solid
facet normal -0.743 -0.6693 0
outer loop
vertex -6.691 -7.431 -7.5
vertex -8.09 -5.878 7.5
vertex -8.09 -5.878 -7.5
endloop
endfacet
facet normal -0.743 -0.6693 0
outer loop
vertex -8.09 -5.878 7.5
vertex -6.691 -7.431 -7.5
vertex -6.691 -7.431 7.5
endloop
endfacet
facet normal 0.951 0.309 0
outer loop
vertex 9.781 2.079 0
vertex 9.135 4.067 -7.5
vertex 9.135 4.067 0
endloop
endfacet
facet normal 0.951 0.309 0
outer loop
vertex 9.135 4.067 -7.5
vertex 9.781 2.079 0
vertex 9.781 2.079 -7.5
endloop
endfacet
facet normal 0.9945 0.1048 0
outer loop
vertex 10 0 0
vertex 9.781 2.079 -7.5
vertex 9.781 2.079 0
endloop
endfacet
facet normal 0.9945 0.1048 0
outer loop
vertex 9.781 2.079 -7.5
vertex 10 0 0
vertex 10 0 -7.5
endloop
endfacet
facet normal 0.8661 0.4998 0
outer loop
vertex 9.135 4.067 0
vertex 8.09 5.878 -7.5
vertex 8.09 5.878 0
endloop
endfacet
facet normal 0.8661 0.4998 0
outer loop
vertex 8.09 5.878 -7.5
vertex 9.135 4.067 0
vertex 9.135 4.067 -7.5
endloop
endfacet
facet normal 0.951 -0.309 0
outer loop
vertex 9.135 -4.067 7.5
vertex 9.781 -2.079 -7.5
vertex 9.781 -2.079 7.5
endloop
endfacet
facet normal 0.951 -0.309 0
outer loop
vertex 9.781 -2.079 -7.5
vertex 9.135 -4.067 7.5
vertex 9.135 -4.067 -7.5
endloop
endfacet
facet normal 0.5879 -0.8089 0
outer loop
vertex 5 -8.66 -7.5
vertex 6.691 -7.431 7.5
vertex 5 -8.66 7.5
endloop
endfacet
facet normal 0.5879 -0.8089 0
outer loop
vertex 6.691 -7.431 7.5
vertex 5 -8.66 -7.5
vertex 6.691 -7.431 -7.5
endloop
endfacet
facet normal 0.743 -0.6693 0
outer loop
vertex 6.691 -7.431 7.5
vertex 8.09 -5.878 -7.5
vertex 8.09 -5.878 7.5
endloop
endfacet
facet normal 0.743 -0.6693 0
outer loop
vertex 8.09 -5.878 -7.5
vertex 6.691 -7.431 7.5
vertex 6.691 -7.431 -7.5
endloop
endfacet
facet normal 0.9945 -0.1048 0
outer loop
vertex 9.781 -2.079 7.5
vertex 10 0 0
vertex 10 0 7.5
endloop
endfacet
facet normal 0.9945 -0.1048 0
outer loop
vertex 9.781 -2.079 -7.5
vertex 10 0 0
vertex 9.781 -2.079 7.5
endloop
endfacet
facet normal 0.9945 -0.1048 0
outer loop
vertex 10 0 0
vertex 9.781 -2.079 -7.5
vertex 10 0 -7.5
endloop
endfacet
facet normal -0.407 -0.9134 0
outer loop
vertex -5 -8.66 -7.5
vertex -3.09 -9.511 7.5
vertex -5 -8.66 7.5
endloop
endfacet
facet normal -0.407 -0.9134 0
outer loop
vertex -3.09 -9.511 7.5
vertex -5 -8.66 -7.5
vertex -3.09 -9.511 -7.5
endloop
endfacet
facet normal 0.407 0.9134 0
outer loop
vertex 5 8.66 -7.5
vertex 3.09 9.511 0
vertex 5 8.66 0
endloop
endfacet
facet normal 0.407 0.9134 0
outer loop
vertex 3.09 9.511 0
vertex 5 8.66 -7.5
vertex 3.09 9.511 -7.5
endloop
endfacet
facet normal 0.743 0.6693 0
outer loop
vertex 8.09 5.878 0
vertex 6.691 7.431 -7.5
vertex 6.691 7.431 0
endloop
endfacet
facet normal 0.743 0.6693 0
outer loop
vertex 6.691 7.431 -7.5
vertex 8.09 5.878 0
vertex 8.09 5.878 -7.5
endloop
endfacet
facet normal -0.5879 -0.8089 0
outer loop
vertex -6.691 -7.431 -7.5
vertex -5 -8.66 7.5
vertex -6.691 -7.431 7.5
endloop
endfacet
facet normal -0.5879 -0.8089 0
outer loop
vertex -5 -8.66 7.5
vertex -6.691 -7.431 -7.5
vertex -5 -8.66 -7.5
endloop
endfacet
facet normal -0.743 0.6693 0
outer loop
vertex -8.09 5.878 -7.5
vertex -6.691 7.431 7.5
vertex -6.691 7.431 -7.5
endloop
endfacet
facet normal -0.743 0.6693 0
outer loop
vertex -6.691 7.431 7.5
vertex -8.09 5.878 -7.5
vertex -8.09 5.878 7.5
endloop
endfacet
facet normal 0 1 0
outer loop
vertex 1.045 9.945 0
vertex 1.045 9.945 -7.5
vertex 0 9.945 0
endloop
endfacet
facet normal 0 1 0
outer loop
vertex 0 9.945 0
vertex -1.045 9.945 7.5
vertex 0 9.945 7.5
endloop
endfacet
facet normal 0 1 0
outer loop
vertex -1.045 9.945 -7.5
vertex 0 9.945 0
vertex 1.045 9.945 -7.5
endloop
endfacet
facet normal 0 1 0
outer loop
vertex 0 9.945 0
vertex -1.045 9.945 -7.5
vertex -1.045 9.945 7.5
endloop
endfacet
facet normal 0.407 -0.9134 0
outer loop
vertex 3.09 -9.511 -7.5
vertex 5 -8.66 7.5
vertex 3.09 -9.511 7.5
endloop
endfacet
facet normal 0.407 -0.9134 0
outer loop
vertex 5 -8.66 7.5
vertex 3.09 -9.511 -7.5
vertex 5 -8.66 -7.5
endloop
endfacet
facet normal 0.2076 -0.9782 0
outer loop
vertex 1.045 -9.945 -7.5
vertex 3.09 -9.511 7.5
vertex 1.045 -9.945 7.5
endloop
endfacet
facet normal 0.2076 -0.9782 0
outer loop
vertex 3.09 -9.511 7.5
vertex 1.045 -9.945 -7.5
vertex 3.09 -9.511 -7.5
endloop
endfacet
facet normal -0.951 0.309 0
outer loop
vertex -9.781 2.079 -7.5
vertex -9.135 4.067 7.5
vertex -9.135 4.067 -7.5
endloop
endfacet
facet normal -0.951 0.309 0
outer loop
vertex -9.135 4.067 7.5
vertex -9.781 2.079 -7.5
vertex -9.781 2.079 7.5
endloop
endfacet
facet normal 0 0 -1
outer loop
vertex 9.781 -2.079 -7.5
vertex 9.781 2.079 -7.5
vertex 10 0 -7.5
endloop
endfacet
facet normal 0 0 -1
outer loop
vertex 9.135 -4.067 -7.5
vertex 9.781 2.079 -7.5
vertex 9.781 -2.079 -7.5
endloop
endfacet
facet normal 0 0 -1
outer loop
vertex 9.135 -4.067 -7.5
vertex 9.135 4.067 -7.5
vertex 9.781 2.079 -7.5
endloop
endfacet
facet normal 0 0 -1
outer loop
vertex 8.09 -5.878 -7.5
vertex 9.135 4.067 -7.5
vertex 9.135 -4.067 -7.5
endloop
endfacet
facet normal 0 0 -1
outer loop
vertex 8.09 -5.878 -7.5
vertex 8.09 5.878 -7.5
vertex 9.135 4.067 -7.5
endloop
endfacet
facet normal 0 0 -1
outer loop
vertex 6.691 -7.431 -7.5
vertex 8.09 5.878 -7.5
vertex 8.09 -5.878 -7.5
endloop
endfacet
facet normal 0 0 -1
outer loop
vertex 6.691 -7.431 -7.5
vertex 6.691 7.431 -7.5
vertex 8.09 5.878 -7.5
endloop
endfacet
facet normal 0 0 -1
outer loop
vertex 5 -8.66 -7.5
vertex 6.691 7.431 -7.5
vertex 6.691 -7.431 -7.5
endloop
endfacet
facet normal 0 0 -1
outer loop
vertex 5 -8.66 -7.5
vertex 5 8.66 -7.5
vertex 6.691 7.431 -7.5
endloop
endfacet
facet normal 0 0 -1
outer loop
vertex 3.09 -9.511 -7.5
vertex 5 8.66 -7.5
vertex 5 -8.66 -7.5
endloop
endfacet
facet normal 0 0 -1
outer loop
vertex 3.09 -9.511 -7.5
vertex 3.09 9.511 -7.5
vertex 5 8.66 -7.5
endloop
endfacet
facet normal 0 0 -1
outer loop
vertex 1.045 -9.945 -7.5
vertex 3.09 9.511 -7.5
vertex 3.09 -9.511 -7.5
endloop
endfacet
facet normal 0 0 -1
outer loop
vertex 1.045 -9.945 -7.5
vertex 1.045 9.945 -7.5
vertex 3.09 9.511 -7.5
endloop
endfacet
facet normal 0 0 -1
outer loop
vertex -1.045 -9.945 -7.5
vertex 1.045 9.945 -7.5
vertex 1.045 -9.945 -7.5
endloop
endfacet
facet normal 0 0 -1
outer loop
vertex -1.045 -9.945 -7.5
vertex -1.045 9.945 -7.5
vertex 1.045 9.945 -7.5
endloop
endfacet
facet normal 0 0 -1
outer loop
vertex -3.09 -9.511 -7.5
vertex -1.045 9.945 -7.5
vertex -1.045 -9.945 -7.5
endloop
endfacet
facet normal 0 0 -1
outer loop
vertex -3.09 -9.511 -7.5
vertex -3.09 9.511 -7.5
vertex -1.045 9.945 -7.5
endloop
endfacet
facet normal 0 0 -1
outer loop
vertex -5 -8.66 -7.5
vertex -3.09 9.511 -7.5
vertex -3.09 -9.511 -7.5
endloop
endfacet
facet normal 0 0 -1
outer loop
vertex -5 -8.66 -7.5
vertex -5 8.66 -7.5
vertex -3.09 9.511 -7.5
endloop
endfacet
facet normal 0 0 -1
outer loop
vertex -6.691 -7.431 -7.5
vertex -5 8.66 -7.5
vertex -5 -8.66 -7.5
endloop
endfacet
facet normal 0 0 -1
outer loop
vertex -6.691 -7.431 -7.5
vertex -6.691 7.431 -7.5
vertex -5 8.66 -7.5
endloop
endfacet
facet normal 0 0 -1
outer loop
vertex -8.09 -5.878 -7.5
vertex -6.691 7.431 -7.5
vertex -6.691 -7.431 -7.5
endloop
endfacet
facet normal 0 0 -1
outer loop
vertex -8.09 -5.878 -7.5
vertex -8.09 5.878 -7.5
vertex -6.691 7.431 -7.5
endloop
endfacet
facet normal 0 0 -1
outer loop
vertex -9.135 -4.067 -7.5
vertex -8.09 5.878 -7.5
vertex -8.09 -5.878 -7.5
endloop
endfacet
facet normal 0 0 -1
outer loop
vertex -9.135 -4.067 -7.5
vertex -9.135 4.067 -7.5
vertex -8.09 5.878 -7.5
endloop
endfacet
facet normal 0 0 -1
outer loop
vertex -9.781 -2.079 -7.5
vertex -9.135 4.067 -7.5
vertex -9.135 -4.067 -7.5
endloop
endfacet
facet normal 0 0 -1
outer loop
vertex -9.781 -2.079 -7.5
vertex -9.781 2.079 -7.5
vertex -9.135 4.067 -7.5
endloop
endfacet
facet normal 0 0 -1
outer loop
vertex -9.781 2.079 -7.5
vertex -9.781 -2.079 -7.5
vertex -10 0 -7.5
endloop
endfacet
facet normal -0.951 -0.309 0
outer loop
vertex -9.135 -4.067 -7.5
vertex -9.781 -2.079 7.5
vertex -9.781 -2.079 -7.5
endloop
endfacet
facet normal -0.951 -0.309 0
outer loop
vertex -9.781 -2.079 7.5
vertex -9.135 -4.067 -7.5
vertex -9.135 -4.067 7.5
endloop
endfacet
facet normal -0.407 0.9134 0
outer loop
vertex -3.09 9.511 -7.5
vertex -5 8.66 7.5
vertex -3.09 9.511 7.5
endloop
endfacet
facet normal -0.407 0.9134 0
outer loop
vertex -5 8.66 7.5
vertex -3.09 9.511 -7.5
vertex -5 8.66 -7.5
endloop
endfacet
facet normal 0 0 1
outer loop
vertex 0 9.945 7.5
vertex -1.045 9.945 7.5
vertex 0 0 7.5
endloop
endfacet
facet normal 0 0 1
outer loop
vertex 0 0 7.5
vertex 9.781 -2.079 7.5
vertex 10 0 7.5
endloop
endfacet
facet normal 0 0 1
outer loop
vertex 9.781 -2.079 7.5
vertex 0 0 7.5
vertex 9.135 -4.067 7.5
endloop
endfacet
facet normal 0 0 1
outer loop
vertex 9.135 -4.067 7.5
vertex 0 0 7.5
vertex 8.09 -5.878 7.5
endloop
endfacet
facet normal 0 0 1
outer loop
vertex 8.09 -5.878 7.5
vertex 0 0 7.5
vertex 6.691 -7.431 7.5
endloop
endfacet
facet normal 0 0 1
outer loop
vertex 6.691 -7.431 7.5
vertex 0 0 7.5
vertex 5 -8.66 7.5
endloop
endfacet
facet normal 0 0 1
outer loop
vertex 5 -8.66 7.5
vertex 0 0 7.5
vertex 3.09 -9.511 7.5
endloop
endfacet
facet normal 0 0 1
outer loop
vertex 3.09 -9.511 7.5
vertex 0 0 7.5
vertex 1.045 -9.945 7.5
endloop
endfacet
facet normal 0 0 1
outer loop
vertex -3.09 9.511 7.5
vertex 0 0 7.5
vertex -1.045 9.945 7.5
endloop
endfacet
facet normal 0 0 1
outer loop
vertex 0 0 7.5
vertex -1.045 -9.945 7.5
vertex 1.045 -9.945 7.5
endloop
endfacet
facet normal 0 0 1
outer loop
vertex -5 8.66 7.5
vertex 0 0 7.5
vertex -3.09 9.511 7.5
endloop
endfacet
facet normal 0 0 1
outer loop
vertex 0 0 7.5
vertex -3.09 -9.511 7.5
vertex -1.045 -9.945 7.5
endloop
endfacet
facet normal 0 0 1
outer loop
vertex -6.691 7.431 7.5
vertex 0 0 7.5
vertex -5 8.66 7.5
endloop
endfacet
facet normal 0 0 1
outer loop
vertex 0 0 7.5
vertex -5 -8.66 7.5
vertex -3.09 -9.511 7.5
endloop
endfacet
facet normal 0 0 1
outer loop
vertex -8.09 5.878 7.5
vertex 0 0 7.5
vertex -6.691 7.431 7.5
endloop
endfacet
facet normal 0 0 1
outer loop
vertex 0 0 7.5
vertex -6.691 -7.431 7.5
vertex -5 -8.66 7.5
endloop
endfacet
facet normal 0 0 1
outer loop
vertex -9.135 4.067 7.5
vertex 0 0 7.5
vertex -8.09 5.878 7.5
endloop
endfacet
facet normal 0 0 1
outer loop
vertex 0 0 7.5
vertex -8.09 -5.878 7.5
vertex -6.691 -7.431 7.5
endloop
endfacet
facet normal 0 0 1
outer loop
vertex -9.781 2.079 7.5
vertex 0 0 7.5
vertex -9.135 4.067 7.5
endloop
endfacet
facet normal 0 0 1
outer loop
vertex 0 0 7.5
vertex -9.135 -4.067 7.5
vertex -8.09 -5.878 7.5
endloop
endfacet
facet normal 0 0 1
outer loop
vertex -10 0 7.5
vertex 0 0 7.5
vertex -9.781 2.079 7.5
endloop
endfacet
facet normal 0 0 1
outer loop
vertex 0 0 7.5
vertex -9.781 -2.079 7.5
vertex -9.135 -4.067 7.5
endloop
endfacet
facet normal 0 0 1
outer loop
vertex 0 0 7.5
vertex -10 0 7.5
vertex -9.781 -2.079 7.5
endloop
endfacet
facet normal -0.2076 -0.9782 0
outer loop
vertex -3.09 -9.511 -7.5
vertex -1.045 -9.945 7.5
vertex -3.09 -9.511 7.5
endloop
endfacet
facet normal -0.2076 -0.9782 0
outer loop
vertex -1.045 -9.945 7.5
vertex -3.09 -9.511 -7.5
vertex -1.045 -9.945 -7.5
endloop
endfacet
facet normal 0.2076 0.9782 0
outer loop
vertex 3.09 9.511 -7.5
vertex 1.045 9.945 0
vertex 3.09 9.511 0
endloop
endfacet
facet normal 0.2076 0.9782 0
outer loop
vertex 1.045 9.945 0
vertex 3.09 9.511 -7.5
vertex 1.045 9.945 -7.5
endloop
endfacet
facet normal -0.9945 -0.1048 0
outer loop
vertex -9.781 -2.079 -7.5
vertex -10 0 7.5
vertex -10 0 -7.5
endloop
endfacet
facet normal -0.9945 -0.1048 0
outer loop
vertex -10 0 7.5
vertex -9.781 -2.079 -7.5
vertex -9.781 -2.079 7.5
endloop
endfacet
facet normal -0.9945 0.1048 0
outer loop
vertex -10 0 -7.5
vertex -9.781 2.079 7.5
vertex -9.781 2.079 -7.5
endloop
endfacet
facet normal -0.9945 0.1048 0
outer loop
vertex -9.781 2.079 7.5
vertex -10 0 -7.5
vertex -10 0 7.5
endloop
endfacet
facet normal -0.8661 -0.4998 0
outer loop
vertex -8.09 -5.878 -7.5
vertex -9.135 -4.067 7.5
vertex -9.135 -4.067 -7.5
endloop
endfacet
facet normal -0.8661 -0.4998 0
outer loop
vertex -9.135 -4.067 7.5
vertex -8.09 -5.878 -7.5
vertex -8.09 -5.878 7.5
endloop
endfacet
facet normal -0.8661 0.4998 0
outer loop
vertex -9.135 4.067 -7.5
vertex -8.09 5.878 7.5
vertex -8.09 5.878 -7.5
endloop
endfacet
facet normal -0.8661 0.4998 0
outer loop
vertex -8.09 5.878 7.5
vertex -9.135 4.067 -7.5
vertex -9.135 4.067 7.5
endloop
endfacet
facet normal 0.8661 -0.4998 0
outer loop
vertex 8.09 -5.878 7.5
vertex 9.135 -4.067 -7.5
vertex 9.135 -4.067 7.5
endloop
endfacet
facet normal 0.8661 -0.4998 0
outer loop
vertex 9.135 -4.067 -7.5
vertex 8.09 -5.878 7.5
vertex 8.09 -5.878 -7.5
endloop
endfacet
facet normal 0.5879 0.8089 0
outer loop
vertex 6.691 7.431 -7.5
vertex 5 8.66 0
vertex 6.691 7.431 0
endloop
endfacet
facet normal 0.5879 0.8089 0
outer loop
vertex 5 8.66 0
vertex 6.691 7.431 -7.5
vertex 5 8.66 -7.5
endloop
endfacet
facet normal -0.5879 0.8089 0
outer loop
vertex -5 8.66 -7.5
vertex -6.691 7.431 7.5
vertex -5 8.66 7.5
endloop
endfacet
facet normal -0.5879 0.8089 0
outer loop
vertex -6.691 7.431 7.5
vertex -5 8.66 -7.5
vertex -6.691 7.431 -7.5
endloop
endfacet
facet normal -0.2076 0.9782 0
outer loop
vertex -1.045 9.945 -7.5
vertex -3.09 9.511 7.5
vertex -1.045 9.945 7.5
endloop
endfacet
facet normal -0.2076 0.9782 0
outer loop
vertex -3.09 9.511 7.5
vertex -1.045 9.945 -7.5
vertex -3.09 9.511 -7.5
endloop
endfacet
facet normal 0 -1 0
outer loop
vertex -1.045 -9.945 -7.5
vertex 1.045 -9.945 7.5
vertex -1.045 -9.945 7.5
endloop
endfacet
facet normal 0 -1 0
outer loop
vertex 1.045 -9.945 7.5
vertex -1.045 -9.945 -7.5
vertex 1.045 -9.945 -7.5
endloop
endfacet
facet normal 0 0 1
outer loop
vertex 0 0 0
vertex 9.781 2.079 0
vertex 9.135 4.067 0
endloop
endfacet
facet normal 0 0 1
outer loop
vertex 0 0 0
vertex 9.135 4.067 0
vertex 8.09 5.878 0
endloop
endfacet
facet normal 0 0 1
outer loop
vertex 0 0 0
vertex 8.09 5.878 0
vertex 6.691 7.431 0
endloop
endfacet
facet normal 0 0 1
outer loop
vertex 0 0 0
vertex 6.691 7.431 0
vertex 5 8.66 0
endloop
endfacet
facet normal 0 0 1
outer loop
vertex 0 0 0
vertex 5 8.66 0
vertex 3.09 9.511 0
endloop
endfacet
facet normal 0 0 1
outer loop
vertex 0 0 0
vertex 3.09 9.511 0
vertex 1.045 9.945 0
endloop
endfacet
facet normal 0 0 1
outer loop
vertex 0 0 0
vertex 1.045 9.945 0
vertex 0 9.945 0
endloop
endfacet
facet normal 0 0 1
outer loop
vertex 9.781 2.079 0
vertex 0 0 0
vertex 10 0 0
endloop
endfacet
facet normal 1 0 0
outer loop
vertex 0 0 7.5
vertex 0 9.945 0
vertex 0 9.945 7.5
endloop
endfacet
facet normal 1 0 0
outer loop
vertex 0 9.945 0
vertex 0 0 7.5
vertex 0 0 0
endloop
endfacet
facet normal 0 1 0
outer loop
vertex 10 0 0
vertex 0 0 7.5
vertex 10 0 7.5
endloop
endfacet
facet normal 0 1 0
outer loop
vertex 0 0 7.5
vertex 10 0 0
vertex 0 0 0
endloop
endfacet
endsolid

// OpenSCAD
// Generated by generate_scads.py
difference() {
  cylinder(h=15, r=10, center=true);
  cube(size=[30,20,25], center=false);
}
